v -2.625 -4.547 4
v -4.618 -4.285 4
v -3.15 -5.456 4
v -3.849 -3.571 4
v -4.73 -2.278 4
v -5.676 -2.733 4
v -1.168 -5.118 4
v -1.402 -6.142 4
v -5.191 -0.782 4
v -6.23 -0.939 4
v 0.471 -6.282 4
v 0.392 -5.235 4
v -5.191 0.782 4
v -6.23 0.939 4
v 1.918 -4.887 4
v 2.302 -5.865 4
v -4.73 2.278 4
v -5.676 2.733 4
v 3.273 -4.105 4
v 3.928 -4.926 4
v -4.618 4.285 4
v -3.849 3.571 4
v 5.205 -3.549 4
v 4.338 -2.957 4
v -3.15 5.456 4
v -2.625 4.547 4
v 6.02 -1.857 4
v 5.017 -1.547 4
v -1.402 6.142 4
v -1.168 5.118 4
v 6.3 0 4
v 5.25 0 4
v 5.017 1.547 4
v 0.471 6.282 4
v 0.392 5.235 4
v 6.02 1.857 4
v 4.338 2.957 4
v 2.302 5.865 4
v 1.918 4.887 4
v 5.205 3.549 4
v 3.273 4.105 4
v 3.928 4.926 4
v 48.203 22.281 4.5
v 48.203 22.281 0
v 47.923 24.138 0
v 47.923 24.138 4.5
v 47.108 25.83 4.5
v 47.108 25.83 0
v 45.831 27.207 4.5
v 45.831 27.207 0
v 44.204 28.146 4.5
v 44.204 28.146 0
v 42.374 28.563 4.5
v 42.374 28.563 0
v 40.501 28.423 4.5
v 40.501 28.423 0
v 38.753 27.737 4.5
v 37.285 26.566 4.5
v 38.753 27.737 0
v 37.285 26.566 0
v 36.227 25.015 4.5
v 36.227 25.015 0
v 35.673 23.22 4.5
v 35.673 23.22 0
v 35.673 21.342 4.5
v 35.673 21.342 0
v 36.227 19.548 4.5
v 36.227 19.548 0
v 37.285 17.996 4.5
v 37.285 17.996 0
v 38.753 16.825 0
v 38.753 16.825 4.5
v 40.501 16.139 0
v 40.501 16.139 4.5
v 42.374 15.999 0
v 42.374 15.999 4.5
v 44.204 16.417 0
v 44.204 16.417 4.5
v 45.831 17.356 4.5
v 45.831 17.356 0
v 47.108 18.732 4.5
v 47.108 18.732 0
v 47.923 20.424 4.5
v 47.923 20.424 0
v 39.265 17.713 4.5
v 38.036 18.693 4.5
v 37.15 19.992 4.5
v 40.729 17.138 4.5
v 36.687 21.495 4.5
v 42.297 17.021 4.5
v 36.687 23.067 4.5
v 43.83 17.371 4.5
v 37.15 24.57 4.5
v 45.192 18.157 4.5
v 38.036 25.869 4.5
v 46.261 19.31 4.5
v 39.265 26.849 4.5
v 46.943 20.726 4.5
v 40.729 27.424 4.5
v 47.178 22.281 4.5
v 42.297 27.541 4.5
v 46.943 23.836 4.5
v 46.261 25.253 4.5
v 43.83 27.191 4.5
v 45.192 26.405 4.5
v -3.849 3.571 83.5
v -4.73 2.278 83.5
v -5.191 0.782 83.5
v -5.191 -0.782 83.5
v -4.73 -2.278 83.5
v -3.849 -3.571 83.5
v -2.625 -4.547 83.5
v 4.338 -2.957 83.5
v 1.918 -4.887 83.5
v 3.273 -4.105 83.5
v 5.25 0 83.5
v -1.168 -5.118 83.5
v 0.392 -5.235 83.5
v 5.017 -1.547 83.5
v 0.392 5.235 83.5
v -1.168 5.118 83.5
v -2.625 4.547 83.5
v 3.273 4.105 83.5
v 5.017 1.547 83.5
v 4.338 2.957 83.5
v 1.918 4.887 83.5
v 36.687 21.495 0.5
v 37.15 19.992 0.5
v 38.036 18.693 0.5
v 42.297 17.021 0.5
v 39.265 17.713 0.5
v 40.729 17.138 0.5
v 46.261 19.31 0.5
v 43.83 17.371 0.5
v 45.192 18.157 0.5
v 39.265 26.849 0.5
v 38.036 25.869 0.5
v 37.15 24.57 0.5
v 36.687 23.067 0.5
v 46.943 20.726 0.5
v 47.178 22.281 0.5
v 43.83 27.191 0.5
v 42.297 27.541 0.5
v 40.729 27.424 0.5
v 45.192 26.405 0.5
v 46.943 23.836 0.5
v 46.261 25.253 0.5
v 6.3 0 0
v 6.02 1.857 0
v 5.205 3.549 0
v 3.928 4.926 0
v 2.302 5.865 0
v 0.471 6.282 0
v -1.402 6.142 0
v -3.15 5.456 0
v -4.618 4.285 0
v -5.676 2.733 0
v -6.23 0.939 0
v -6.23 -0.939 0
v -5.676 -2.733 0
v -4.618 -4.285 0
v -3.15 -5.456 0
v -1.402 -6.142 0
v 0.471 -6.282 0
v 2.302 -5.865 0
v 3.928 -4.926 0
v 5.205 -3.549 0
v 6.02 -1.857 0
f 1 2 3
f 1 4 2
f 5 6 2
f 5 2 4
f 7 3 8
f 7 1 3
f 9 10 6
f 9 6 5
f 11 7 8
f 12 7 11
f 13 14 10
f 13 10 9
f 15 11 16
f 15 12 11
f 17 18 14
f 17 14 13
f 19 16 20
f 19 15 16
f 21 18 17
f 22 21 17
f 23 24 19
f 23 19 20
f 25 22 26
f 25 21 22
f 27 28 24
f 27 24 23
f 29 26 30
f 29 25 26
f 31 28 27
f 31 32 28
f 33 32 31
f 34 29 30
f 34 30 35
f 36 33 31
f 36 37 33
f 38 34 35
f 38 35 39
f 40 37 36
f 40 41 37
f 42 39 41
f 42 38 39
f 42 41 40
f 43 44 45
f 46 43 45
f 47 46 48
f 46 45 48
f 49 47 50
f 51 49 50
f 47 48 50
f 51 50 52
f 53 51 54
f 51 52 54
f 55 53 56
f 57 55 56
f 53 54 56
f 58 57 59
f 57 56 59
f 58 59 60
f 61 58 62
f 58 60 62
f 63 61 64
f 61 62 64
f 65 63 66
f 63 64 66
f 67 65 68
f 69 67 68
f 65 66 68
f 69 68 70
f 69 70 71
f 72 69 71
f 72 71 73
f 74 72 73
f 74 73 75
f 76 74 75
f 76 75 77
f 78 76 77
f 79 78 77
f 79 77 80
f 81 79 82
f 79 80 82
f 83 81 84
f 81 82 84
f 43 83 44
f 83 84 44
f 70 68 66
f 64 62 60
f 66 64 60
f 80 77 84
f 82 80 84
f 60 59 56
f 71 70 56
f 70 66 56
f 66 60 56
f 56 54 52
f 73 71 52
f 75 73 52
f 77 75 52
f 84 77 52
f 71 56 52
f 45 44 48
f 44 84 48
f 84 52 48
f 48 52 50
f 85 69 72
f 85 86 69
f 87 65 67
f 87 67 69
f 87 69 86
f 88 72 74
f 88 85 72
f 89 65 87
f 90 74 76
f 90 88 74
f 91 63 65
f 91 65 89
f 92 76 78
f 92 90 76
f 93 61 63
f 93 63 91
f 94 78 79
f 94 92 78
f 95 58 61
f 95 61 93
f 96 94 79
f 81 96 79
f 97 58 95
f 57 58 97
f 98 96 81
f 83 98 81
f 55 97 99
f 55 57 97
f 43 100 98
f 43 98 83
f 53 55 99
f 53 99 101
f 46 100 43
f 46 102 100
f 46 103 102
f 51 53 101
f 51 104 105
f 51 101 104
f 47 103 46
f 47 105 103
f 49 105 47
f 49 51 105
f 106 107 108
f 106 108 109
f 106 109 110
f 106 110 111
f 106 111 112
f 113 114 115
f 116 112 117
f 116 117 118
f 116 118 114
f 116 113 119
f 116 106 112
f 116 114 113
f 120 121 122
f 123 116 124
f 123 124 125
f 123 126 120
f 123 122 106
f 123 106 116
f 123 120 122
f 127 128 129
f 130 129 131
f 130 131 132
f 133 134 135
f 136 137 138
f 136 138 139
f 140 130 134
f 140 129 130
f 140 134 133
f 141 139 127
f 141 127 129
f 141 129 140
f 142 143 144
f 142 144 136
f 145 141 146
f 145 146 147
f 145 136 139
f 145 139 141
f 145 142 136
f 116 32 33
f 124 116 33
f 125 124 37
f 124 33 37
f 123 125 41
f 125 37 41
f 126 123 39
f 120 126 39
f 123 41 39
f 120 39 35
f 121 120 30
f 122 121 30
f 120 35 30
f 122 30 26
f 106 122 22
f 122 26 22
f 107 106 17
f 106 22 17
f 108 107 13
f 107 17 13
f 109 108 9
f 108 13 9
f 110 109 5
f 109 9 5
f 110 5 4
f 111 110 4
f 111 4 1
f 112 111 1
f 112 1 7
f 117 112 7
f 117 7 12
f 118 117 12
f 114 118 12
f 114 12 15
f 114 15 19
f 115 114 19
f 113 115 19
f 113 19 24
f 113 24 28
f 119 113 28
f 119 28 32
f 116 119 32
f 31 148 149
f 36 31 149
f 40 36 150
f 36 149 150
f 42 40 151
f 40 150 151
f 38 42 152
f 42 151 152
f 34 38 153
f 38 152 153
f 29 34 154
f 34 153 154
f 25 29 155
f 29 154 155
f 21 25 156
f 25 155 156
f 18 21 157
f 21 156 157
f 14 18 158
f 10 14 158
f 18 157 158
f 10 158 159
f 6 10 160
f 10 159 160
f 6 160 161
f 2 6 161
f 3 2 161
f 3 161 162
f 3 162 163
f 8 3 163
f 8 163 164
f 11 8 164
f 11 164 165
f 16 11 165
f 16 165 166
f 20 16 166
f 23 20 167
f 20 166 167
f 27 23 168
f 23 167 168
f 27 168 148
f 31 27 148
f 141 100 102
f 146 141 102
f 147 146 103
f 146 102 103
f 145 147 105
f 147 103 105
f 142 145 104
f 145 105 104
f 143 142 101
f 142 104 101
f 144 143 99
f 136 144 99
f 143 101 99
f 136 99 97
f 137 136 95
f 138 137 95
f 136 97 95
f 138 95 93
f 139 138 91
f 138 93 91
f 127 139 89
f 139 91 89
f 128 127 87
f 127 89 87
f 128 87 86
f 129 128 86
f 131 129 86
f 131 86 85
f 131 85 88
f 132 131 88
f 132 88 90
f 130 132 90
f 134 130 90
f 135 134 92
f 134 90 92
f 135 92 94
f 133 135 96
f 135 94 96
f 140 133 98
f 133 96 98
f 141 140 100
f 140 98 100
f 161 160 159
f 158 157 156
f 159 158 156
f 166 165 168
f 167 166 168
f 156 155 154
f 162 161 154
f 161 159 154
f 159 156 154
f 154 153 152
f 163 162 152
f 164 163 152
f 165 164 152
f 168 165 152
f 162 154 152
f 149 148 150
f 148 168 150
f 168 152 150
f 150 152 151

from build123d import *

# Parameters (mm, degrees)
F0_R      = 5.25
F1_DEPTH  = 84
F0_R_2    = 6.3
F2_DEPTH  = 4
F3_R      = 6.3
F4_DEPTH  = 4.5
F5_R      = 5.275
F6_DEPTH  = 4
F1_FACE_R = 5.25
F7_DEPTH  = 0.5


with BuildPart() as f1:
    # F0 (on Top) → F1 (new body)
    with BuildSketch(Plane.XY):
        Circle(F0_R)
    extrude(amount=F1_DEPTH)

    # F0 (on Top) → F2 (join)
    with BuildSketch(Plane.XY):
        Circle(F0_R_2)
        Circle(F0_R, mode=Mode.SUBTRACT)
    extrude(amount=F2_DEPTH)

    # F1_face (on face) → F7 (cut)
    with BuildSketch(Plane.XY.offset(84)):
        Circle(F1_FACE_R)
    extrude(amount=-F7_DEPTH, mode=Mode.SUBTRACT)


with BuildPart() as f4:
    # F3 (on Top) → F4 (new body)
    with BuildSketch(Plane.XY):
        with Locations((41.902754, 22.281056)):
            Circle(F3_R)
    extrude(amount=F4_DEPTH)

    # F5 (on face) → F6 (cut)
    with BuildSketch(Plane.XY.offset(4.5)):
        with Locations((41.902754, 22.281056)):
            Circle(F5_R)
    extrude(amount=-F6_DEPTH, mode=Mode.SUBTRACT)


solid = Compound([f1.part, f4.part])
